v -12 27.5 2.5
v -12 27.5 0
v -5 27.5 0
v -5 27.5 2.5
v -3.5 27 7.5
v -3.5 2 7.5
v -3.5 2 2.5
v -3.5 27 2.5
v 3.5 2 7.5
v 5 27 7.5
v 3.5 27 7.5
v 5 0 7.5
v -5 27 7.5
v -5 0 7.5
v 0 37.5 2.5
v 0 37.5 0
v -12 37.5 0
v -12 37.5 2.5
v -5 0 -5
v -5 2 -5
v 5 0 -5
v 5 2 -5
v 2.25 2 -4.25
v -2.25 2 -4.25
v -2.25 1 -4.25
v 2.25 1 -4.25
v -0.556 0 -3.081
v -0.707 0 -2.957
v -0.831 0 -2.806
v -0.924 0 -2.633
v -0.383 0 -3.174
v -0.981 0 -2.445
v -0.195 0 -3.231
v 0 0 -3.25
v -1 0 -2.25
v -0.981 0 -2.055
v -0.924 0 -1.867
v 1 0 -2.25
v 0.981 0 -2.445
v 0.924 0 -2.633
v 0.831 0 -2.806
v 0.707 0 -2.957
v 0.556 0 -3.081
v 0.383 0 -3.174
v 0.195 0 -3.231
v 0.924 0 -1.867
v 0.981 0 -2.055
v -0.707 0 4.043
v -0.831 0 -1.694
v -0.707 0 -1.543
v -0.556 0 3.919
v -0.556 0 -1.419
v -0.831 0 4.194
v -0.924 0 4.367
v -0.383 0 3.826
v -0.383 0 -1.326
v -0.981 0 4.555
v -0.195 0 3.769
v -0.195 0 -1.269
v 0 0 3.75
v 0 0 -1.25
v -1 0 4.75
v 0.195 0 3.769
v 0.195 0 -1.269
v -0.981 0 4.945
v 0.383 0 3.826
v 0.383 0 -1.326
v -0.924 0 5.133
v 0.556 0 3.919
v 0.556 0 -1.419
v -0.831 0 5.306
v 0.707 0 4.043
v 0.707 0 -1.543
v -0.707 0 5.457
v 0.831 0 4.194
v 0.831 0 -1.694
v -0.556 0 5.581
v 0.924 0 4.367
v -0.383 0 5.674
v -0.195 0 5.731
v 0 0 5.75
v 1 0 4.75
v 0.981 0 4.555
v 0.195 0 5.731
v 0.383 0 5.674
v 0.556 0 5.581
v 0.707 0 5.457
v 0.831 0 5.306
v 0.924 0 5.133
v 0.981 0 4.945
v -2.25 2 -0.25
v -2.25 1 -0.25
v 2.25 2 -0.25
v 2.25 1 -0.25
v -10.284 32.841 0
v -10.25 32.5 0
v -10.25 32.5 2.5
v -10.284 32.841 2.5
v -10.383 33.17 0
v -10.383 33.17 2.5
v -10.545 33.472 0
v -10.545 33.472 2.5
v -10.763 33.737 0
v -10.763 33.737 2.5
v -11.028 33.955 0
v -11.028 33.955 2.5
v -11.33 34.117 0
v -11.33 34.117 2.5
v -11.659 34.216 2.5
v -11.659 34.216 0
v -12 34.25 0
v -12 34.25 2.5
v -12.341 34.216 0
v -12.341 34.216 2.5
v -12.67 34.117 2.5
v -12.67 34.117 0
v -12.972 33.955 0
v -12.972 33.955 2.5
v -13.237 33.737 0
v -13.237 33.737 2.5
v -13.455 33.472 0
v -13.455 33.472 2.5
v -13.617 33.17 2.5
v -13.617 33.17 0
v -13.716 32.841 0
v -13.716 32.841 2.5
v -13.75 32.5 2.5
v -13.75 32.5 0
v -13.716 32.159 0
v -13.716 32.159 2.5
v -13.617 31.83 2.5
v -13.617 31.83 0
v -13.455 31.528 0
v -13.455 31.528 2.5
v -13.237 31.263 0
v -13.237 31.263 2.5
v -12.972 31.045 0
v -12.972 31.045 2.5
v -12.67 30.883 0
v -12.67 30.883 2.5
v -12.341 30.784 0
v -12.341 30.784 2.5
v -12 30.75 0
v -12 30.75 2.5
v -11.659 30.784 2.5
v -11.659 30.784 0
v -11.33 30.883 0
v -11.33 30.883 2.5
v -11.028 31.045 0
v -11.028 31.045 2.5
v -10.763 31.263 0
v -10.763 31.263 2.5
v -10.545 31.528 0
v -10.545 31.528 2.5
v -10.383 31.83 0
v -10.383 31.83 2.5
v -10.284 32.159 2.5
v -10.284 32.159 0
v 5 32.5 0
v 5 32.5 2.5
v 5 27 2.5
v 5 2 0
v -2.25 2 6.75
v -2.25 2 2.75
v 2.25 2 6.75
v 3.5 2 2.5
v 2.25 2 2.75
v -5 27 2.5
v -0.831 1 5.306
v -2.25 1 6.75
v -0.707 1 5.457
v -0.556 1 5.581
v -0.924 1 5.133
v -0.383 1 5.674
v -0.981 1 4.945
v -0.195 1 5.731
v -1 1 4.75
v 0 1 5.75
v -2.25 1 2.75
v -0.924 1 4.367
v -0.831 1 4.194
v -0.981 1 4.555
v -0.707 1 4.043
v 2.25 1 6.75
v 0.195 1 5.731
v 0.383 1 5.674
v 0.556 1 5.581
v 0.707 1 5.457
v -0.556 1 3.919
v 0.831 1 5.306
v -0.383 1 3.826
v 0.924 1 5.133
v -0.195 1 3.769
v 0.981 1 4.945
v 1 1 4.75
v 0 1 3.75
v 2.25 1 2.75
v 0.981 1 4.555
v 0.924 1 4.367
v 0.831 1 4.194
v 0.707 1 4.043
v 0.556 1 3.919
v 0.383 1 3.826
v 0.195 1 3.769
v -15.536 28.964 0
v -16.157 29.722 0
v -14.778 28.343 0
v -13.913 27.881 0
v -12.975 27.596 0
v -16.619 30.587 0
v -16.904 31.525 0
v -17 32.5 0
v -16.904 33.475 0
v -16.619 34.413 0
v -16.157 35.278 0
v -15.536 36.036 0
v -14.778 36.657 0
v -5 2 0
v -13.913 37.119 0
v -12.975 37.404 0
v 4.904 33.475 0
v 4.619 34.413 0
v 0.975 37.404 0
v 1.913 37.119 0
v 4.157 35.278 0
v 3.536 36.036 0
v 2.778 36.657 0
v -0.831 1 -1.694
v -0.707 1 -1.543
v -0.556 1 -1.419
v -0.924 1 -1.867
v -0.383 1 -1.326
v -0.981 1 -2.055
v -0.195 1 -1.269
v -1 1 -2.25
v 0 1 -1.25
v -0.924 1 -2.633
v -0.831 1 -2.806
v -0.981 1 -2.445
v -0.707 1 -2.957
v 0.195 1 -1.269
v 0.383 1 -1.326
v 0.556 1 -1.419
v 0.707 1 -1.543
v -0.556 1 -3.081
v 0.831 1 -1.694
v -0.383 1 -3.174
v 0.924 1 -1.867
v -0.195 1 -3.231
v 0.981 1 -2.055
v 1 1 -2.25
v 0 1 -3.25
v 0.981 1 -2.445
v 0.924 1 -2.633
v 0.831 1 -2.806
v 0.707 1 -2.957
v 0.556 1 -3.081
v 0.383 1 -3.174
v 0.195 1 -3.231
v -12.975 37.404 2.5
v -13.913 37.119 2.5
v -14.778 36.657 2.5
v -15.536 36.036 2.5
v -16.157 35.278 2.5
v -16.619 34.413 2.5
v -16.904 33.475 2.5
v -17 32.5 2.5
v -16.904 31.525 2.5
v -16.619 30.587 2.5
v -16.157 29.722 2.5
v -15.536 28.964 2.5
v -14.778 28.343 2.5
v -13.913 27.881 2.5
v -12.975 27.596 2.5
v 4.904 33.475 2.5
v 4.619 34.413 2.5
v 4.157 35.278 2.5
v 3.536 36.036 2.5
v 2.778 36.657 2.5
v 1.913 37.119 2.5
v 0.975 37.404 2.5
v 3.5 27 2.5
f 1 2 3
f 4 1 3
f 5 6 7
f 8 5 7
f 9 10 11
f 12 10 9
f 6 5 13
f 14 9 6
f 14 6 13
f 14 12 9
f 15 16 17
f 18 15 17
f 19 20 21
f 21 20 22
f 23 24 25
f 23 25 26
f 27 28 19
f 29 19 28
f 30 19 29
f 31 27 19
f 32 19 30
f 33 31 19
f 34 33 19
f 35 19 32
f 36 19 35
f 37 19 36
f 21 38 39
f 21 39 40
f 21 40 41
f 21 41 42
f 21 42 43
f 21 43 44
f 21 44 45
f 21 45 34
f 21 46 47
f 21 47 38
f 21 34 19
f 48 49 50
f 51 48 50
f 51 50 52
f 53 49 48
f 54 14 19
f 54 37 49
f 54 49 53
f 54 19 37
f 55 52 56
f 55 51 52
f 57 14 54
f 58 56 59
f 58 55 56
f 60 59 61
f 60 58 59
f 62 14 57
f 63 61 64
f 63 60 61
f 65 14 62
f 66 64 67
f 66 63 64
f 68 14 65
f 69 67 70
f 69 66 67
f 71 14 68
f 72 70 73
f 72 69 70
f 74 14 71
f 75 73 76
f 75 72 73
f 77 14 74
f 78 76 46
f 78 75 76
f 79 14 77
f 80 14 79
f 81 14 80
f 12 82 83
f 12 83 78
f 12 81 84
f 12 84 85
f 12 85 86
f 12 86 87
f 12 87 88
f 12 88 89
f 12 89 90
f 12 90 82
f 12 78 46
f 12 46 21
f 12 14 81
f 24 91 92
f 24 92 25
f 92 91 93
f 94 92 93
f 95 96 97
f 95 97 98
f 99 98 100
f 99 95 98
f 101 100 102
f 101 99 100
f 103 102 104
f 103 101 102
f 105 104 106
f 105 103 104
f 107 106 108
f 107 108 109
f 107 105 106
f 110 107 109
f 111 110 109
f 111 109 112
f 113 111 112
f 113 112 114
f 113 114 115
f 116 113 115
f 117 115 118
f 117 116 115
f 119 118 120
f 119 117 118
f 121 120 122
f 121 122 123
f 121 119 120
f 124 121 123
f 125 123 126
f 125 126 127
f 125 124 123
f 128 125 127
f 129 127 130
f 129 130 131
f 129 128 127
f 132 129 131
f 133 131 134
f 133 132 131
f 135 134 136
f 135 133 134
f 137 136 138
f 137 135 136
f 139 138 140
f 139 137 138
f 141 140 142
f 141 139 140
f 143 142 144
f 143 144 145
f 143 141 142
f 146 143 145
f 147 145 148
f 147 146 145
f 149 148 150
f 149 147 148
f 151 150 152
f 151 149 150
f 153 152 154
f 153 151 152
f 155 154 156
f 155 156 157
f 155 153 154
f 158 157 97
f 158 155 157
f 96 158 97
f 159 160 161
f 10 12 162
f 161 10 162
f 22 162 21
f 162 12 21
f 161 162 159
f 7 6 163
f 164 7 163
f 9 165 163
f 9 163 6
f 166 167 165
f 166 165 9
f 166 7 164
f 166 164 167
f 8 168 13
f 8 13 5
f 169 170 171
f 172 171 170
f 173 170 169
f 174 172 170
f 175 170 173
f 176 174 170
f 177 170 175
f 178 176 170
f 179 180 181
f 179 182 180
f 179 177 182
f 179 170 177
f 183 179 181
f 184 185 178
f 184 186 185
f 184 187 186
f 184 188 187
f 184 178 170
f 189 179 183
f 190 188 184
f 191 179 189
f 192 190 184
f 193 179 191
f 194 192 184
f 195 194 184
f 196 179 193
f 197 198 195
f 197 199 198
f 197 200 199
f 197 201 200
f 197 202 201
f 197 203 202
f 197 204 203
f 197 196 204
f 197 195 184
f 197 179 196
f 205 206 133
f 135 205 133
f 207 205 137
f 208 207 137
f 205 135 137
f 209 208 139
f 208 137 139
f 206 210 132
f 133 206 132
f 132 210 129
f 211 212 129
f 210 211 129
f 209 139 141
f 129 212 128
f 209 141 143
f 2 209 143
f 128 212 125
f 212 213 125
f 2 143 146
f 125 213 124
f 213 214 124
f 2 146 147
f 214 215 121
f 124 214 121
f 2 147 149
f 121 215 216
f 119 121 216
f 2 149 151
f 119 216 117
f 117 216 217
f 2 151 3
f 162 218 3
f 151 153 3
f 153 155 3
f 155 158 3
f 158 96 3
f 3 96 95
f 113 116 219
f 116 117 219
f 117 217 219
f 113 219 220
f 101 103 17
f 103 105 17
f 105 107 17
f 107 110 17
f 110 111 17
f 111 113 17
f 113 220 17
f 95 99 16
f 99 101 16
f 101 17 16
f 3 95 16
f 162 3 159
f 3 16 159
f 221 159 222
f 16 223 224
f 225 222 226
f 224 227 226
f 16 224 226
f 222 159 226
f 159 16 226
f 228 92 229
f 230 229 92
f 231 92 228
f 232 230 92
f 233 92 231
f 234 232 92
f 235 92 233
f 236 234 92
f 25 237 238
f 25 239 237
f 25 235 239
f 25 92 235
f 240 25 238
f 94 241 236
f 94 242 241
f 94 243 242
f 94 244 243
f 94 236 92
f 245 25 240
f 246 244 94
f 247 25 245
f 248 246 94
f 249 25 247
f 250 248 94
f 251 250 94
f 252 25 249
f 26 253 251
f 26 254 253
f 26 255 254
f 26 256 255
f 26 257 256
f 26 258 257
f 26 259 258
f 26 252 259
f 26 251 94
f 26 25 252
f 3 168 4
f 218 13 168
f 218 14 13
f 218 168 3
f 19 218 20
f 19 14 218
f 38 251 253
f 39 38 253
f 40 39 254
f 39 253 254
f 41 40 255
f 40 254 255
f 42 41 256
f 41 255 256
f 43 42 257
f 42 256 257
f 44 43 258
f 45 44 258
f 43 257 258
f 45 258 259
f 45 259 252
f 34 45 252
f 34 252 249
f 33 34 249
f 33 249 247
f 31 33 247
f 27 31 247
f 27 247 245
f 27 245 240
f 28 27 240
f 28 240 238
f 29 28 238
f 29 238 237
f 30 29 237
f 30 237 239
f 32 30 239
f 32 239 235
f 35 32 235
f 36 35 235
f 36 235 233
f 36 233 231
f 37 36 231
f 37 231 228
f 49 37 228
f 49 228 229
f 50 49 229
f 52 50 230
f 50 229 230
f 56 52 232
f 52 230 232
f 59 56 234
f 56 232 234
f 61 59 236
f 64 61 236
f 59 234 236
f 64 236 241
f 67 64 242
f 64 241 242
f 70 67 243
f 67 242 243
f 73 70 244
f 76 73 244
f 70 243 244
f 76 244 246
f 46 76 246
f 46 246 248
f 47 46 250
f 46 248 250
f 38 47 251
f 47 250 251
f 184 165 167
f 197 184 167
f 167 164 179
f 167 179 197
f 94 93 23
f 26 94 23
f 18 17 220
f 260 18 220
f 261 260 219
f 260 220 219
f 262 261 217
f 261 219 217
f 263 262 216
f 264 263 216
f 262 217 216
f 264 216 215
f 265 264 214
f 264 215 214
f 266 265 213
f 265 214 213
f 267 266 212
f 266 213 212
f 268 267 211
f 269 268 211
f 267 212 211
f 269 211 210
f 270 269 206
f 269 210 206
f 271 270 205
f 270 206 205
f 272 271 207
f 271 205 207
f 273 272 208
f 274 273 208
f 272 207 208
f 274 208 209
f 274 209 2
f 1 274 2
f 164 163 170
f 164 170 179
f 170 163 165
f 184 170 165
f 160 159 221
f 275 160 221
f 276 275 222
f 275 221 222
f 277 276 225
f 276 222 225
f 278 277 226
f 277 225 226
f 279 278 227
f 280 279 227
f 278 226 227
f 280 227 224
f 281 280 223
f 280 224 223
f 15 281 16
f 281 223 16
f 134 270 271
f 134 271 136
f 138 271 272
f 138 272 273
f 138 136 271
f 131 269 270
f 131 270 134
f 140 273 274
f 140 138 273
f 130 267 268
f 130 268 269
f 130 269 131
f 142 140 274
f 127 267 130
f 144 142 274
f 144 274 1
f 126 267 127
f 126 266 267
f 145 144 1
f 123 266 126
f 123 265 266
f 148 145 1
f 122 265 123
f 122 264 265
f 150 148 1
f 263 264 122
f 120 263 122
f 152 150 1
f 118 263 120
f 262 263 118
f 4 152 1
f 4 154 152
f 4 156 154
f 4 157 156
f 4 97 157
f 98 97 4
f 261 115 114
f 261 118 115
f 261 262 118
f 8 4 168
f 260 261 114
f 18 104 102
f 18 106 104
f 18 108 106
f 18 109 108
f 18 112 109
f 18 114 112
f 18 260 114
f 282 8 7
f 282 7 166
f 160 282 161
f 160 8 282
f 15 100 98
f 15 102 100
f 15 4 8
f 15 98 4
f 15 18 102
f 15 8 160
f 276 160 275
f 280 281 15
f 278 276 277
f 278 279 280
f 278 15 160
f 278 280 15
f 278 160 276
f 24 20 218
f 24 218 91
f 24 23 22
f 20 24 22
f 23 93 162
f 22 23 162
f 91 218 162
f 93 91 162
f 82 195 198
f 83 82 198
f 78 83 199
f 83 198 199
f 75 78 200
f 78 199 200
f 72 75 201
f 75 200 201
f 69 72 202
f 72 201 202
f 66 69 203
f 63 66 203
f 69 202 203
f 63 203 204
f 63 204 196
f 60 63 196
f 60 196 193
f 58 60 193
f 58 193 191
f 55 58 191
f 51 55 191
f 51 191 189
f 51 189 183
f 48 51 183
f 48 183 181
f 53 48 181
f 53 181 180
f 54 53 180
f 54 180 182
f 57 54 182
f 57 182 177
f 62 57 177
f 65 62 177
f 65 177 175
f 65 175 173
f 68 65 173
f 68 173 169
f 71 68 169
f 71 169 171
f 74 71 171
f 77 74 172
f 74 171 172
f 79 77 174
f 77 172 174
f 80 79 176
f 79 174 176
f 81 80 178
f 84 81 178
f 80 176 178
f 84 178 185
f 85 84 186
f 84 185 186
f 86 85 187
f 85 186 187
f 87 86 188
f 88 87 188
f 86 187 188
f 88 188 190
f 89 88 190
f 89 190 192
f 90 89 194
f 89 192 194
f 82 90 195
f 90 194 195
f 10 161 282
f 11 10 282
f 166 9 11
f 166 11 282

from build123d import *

# Parameters (mm, degrees)
SKETCH1_R          = 1.75
AXLEHOLDER_DEPTH   = 2.5
SKETCH1_3_W        = 10
SKETCH1_3_H        = 2
BASE_DEPTH         = 7.5
BASE_DEPTH_BACK    = 5
SKETCH2_R          = 1
BOLTHOLES_DEPTH    = 3
SKETCH3_W          = 4.5
SKETCH3_H          = 4
NUTSLOTS_DEPTH     = 1
SKETCH4_W          = 1.5
SKETCH4_H          = 5
STIFFENERRIB_DEPTH = 25


with BuildPart() as part:
    # Sketch1 → AxleHolder (new body)
    with BuildSketch(Plane.XY):
        with BuildLine():
            Line((-12, 27.5), (-5, 27.5))
            Line((-5, 27.5), (-5, 0))
            Line((-5, 0), (5, 0))
            Line((5, 0), (5, 32.5))
            ThreePointArc((5, 32.5), (3.535533906, 36.035533906), (0, 37.5))
            Line((0, 37.5), (-12, 37.5))
            ThreePointArc((-12, 37.5), (-17, 32.5), (-12, 27.5))
        make_face()
        with Locations((-12, 32.5)):
            Circle(SKETCH1_R, mode=Mode.SUBTRACT)
    extrude(amount=AXLEHOLDER_DEPTH)

    # Sketch1<3> → Base (add, two sides)
    with BuildSketch(Plane.XY) as base_sk:
        with Locations((0, 1)):
            Rectangle(SKETCH1_3_W, SKETCH1_3_H)
    extrude(amount=BASE_DEPTH)
    extrude(base_sk.sketch, amount=-BASE_DEPTH_BACK)

    # Sketch2 → BoltHoles (cut, through all)
    with BuildSketch(Plane(origin=(0, 2, 0), x_dir=(1, 0, 0), z_dir=(0, 1, 0))):
        with Locations((0, 2.25)):
            Circle(SKETCH2_R)
        with Locations((0, -4.75)):
            Circle(SKETCH2_R)
    extrude(amount=-BOLTHOLES_DEPTH, mode=Mode.SUBTRACT)

    # Sketch3 → NutSlots (cut)
    with BuildSketch(Plane(origin=(0, 2, 0), x_dir=(1, 0, 0), z_dir=(0, 1, 0))):
        with Locations((0, -4.75)):
            Rectangle(SKETCH3_W, SKETCH3_H)
        with Locations((0, 2.25)):
            Rectangle(SKETCH3_W, SKETCH3_H)
    extrude(amount=-NUTSLOTS_DEPTH, mode=Mode.SUBTRACT)

    # Sketch4 → StiffenerRib (add)
    with BuildSketch(Plane(origin=(0, 2, 0), x_dir=(1, 0, 0), z_dir=(0, 1, 0))):
        with Locations((-4.25, -5)):
            Rectangle(SKETCH4_W, SKETCH4_H)
    stiffenerrib = extrude(amount=STIFFENERRIB_DEPTH)

    # StiffenerRib2: StiffenerRib across plane
    add(stiffenerrib.mirror(Plane(origin=(0, 0, 0), x_dir=(0, 0, 1), z_dir=(1, 0, 0))))


solid = part.part
